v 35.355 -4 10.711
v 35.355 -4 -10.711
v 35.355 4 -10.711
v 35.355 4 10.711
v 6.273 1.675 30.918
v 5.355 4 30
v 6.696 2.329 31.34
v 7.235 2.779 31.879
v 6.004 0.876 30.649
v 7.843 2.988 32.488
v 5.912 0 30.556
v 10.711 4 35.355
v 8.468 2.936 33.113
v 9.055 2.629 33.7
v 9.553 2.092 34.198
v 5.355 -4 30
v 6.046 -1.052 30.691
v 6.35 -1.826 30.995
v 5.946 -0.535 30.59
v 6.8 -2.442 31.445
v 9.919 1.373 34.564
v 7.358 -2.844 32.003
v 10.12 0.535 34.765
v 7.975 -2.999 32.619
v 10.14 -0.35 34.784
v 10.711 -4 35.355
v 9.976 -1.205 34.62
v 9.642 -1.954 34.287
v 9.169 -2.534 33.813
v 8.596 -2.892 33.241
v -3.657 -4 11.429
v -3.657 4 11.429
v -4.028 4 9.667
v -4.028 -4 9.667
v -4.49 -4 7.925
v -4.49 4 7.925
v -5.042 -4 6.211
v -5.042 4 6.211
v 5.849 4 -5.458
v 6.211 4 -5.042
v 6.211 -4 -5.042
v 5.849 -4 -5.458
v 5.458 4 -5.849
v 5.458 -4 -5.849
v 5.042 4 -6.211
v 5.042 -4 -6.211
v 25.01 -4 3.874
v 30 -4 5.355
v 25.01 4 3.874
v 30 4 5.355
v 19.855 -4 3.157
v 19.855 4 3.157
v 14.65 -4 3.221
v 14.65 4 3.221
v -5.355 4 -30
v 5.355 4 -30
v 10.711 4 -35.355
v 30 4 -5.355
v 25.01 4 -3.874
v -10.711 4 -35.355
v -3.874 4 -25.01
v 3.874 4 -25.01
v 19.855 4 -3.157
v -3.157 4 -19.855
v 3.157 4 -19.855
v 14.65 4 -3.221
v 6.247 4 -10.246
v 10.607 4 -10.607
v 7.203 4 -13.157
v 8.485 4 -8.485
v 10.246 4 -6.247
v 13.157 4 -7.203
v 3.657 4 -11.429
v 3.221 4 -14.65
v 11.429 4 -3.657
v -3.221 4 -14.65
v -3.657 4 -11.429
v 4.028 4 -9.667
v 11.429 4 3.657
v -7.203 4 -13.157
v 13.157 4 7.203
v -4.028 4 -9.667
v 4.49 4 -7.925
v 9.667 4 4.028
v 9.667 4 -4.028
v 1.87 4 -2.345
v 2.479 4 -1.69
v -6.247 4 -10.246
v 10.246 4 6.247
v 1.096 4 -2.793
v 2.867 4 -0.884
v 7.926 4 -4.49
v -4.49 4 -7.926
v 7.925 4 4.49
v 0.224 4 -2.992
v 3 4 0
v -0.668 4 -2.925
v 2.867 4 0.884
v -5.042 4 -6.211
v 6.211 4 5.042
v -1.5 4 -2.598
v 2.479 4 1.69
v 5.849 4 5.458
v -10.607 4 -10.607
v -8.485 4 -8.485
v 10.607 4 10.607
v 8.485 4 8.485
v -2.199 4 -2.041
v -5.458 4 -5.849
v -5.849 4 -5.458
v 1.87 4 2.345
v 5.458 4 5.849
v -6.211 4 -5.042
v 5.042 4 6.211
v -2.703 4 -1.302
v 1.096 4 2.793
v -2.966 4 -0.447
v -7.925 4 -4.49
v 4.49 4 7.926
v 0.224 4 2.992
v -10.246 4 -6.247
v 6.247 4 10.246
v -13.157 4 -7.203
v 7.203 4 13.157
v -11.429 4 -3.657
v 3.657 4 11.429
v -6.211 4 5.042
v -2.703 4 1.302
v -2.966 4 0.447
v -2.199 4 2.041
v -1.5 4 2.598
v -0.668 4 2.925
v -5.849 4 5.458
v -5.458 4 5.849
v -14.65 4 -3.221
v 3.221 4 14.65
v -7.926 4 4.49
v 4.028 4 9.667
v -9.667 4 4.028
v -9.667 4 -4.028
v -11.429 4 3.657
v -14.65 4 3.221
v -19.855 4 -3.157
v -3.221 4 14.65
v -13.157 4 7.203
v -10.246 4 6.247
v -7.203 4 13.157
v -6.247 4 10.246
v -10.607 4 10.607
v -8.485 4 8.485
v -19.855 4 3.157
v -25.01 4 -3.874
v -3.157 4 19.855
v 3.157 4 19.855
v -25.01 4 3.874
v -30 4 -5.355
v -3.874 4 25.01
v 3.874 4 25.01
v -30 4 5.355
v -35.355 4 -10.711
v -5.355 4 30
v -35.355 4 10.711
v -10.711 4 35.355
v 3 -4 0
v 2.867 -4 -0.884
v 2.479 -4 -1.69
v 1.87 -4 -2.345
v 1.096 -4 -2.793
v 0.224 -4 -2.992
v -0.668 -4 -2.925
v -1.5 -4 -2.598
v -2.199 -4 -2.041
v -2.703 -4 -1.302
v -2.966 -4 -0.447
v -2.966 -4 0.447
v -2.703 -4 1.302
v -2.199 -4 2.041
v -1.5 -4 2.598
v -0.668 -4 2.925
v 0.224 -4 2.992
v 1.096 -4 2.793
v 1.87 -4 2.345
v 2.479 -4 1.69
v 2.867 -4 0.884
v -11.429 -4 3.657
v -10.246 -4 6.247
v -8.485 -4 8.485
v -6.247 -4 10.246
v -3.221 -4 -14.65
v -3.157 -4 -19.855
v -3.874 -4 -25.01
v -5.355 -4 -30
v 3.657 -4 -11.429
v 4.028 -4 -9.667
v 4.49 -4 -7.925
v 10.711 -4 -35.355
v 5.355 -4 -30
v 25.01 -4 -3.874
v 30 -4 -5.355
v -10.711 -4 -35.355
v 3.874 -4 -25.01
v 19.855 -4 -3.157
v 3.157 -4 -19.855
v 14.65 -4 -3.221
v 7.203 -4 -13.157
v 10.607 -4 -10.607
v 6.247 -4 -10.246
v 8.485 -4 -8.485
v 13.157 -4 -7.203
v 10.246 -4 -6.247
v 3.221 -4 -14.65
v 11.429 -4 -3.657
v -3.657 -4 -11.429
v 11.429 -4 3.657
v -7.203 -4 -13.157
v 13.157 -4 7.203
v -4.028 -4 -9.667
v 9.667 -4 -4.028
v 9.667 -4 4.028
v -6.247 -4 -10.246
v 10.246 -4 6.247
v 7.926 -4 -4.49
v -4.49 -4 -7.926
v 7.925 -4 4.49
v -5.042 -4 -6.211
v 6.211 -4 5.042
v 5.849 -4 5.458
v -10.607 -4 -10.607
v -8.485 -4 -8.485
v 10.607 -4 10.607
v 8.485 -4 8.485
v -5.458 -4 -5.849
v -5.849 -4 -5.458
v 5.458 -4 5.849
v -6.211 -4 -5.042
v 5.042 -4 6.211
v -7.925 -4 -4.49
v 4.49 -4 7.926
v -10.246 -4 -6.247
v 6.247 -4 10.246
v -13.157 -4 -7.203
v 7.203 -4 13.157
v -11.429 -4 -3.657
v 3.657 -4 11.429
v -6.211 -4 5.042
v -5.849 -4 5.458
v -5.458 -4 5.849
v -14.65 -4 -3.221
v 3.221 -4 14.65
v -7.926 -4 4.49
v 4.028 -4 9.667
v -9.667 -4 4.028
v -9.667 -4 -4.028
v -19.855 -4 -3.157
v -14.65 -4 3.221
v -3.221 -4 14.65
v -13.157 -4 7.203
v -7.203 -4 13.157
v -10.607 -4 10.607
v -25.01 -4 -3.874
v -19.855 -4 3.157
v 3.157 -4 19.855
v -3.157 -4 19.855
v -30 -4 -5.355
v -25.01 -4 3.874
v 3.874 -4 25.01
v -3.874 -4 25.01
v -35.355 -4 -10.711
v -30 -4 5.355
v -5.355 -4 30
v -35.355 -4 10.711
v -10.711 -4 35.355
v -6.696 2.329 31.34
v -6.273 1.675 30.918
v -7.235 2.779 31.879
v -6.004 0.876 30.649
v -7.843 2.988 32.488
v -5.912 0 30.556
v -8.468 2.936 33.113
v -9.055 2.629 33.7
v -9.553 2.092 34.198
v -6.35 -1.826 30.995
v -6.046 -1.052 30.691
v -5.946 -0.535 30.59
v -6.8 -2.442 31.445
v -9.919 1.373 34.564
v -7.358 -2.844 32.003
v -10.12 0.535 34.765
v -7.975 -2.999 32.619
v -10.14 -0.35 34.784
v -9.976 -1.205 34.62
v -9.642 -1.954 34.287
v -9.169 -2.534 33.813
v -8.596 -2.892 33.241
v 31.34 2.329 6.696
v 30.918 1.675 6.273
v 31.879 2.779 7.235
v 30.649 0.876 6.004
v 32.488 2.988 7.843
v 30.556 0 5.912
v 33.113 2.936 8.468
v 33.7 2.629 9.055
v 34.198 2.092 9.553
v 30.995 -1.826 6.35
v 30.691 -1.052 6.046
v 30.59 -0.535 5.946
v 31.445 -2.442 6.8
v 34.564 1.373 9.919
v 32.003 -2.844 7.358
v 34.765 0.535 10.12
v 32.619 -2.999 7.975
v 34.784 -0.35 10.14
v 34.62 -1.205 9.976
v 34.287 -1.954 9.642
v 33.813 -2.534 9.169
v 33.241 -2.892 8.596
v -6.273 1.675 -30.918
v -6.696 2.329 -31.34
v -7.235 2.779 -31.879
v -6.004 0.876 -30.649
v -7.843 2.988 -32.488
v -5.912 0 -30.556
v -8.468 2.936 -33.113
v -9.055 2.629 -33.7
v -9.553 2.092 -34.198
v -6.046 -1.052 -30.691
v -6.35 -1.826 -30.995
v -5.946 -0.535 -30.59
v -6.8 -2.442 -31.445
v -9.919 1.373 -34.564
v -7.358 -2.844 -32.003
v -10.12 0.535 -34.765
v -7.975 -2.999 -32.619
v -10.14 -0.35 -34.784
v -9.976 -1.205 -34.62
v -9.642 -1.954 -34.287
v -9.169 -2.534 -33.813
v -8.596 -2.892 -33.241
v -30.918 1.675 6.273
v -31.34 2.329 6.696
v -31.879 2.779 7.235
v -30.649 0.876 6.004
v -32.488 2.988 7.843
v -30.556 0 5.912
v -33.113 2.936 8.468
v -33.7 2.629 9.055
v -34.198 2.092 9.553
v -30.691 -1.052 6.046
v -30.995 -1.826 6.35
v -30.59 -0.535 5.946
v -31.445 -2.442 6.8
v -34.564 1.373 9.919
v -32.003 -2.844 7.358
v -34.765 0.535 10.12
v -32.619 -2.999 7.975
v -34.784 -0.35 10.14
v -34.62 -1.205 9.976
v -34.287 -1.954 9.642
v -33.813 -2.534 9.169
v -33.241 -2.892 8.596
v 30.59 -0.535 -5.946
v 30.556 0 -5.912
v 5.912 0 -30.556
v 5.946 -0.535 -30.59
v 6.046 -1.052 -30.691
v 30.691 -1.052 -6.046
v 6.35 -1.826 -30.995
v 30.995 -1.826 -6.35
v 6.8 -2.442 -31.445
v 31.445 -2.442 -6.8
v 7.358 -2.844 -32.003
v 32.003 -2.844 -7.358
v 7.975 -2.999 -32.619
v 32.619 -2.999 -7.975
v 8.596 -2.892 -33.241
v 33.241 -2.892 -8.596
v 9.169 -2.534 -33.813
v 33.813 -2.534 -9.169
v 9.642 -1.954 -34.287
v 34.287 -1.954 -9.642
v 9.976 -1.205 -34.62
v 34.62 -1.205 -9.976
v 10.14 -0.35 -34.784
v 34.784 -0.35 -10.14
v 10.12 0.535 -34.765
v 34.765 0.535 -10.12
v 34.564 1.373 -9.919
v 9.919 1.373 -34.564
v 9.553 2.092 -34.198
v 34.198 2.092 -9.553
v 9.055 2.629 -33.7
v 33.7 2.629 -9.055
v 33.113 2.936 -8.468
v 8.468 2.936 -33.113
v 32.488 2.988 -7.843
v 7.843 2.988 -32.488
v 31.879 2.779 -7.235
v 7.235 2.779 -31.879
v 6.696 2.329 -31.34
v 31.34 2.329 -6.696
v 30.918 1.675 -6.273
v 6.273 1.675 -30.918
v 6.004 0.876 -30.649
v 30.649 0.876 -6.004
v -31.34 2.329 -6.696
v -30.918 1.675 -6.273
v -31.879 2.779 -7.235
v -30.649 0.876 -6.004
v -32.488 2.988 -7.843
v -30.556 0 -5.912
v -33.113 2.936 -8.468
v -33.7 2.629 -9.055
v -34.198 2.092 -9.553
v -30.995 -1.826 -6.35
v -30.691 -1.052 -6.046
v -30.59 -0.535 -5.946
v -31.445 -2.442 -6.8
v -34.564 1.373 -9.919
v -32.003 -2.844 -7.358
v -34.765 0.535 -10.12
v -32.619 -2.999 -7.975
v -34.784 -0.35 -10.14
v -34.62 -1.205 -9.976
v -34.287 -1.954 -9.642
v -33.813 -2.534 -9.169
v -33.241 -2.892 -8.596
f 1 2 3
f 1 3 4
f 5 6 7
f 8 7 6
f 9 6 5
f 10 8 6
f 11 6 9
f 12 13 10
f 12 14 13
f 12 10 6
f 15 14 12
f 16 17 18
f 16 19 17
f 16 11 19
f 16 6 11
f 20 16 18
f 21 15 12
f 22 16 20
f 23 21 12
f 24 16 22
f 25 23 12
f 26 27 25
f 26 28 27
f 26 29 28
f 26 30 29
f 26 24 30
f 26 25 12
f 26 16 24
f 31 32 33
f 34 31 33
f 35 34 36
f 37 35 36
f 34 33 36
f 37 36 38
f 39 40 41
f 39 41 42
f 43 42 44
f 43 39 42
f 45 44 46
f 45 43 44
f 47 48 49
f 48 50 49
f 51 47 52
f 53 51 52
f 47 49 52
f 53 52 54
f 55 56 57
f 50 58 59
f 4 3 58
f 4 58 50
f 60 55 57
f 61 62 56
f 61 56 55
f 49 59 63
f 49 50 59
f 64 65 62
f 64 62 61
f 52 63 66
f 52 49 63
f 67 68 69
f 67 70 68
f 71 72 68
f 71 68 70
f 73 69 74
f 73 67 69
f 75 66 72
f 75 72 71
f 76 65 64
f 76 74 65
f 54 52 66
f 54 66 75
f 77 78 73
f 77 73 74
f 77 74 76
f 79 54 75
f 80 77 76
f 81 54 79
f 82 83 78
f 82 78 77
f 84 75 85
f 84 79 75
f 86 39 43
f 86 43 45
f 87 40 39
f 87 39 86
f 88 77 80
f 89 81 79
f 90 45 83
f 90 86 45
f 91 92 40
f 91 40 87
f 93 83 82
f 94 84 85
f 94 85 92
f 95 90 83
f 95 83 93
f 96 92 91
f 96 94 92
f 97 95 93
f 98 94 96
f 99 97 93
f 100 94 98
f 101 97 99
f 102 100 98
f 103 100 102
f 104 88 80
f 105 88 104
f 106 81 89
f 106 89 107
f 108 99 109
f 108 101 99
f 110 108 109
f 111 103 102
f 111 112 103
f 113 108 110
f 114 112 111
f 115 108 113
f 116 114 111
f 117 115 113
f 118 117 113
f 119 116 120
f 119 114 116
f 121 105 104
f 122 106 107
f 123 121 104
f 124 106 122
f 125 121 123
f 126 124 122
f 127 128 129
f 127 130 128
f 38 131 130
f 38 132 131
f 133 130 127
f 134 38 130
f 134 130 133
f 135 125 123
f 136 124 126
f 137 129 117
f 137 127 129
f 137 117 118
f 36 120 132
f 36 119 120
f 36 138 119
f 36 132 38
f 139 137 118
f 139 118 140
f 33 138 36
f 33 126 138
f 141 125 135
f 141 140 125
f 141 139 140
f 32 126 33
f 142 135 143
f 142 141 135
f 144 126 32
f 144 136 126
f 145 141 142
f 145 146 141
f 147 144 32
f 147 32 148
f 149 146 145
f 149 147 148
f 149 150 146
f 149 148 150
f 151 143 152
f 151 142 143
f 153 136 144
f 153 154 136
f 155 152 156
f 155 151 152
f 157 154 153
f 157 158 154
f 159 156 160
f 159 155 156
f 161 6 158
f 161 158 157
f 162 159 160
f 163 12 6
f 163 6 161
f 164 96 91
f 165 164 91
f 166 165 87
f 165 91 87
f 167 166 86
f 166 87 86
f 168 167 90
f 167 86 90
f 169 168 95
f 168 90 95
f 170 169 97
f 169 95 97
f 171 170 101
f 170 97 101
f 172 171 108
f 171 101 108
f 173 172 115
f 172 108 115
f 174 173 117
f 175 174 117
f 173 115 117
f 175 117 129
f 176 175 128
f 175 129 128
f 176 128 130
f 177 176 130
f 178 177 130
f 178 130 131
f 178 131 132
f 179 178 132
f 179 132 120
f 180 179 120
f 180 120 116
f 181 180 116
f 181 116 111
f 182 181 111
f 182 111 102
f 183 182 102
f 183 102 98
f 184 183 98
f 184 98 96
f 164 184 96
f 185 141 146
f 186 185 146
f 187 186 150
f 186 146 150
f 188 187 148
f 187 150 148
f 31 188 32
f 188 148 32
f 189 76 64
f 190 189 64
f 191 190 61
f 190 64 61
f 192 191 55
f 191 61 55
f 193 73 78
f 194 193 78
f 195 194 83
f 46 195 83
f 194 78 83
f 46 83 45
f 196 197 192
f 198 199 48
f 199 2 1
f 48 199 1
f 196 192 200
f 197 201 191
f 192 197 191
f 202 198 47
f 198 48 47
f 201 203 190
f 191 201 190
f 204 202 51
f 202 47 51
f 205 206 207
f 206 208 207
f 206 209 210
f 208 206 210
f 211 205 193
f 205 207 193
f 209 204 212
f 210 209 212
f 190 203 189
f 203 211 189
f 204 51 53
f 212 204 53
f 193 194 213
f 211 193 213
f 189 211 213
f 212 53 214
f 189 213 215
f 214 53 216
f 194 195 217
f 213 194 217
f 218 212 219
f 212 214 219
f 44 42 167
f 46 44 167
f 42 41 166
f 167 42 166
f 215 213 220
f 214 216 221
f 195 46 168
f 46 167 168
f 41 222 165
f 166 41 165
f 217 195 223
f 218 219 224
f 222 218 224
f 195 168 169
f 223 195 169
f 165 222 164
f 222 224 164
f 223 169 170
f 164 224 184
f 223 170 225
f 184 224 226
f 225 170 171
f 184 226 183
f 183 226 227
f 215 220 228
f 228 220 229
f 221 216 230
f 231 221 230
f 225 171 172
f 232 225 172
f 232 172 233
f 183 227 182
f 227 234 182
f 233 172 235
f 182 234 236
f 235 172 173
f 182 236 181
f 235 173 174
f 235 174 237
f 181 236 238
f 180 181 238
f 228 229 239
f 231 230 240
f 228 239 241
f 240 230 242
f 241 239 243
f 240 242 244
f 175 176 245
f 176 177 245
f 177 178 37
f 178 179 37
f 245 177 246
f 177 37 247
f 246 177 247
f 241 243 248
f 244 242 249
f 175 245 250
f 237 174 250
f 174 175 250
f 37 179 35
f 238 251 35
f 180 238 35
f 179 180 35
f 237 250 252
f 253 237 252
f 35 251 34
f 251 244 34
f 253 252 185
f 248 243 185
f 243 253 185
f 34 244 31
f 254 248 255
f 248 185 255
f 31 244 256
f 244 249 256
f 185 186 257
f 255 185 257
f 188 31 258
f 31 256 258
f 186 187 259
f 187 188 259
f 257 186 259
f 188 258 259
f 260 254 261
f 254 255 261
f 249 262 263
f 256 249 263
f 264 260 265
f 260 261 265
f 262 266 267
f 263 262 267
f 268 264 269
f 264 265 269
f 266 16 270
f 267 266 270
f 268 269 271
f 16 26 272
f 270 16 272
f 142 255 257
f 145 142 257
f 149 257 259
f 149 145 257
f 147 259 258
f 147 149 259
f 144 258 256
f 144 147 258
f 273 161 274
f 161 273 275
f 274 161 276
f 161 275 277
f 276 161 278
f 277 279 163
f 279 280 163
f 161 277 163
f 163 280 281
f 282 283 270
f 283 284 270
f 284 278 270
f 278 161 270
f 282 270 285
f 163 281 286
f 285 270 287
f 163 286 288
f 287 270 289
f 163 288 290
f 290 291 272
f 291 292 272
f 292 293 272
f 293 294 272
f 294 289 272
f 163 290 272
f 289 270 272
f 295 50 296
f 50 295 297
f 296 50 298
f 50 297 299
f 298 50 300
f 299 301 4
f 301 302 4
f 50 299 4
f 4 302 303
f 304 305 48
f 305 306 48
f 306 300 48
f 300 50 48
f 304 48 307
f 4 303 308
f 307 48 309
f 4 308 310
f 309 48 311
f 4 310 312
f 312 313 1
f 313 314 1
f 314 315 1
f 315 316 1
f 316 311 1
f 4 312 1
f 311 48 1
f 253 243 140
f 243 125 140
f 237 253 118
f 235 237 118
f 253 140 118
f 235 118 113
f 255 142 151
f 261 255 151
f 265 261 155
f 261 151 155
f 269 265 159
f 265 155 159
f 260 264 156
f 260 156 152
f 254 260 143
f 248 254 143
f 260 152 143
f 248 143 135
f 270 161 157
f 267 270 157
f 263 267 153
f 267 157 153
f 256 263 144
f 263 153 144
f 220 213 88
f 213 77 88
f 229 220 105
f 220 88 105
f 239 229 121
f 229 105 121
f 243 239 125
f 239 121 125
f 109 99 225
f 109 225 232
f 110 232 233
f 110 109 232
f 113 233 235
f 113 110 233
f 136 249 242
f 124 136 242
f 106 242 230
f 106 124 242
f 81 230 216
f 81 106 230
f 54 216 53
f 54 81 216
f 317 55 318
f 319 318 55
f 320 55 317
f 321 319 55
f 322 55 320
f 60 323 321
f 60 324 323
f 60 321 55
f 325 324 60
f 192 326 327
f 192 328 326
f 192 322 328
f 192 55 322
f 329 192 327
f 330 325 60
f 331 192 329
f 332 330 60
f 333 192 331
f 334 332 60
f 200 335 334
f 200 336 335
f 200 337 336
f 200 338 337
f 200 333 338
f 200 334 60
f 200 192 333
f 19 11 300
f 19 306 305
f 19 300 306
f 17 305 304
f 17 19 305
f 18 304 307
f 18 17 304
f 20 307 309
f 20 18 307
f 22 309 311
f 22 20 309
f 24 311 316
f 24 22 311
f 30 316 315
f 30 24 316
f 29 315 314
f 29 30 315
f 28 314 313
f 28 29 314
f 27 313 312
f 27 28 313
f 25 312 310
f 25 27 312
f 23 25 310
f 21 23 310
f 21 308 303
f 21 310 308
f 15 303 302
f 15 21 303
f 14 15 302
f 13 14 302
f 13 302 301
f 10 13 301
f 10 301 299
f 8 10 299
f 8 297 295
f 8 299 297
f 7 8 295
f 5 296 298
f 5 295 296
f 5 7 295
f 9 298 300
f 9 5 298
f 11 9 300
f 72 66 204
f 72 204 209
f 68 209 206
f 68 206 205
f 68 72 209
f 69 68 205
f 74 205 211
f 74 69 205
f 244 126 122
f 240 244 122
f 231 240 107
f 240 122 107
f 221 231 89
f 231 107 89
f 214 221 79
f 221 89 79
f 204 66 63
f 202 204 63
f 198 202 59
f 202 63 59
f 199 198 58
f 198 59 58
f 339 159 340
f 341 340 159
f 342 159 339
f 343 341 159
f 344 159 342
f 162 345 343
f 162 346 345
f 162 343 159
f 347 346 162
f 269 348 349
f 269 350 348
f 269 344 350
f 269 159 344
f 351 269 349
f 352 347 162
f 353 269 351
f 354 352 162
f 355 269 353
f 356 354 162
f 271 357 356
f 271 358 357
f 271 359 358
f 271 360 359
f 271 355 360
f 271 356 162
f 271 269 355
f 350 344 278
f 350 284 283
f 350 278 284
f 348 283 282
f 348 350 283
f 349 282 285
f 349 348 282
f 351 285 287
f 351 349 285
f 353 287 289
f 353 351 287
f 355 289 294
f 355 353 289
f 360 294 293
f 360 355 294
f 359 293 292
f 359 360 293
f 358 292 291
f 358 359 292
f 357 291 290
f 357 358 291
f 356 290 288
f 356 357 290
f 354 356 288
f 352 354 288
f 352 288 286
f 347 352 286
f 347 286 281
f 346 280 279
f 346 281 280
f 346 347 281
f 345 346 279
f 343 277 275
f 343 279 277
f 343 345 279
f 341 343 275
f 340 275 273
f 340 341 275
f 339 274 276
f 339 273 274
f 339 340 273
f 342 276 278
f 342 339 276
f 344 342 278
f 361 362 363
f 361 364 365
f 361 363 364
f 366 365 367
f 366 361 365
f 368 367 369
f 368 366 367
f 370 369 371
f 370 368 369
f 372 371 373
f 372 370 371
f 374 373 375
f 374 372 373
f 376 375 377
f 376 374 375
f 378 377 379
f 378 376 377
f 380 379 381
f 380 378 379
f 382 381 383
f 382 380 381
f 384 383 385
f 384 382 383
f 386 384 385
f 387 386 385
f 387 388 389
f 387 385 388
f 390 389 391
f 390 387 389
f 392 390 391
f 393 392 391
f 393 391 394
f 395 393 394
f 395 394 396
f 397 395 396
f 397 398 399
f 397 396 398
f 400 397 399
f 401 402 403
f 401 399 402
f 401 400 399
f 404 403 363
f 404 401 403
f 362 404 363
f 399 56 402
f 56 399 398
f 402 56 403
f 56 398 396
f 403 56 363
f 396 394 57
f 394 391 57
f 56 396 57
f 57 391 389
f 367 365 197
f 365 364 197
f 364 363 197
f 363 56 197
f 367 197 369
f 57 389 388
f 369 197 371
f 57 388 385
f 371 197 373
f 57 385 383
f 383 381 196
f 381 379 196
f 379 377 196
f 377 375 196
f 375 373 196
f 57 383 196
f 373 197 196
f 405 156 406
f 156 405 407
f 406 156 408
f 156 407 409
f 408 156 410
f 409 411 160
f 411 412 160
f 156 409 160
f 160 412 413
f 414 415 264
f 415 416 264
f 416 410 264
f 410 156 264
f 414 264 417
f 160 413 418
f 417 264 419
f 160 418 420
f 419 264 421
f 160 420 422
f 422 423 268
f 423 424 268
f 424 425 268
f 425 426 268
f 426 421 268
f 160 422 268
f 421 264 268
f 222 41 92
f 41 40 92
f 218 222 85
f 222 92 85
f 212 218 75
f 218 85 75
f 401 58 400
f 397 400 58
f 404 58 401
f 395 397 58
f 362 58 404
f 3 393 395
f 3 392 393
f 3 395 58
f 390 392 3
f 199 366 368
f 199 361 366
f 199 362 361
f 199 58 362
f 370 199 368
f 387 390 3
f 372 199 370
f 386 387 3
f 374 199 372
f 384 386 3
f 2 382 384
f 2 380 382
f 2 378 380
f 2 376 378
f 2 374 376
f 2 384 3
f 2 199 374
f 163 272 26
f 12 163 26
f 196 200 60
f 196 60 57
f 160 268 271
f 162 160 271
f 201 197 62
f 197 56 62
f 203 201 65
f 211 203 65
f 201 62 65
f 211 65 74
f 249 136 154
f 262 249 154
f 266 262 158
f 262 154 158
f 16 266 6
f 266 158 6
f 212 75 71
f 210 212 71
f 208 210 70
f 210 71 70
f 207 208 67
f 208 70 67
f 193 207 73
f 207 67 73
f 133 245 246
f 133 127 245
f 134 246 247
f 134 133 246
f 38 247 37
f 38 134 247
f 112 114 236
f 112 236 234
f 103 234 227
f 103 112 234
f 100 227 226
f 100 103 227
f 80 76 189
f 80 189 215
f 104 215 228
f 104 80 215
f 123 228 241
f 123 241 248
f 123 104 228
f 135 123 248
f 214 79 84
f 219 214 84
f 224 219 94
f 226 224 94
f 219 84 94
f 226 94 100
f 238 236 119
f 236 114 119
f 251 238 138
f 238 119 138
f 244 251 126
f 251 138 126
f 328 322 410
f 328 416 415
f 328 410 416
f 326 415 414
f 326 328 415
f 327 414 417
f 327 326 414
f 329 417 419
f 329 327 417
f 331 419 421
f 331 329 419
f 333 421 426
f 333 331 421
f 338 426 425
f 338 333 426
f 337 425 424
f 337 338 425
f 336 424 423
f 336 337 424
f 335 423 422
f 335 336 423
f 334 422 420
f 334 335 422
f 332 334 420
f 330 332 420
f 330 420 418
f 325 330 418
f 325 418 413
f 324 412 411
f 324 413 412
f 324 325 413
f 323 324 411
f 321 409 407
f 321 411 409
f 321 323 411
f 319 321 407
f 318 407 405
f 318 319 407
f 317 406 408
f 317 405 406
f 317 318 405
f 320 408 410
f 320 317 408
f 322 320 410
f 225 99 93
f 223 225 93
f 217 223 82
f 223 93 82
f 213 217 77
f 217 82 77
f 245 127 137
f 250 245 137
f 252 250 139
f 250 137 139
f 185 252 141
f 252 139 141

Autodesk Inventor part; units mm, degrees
ref_plane "YZ Plane" through (0, 0, 0) normal (1, 0, 0) x (0, 1, 0)
ref_plane "XZ Plane" through (0, 0, 0) normal (0, 1, 0) x (-1, 0, 0)
ref_plane "XY Plane" through (0, 0, 0) normal (0, 0, 1) x (1, 0, 0)
sketch "スケッチ1" plane through (0, 0, 0) normal (0, 1, 0) x (-1, 0, 0)
  line L0 (-35.3553, 0) -> (0, 35.3553)
  line L1 (0, 35.3553) -> (35.3553, 0)
  line L2 (35.3553, 0) -> (0, -35.3553)
  line L3 (0, -35.3553) -> (-35.3553, 0)
  line L4 (-25, 25) -> (25, -25) construction
  line L5 (25, 25) -> (-25, -25) construction
  line L6 (0, 0) -> (0, -30)
  line L7 (0, -30) -> (5.3553, -30)
  line L8 (5.3553, -30) -> (10.7107, -35.3553)
  line L9 (5.3553, -30) -> (5.3553, 0)
  line L10 (0, 0) -> (30, 0)
  line L11 (30, 0) -> (30, -5.3553)
  line L12 (30, -5.3553) -> (0, -5.3553)
  line L13 (35.3553, 0) -> (47.1243, -11.769)
  line L14 (35.3553, 0) -> (35.3553, -35.3553)
  line L15 (0, -35.3553) -> (35.3553, -35.3553)
  line L16 (30, -5.3553) -> (35.3553, -10.7107)
  line L17 (5.3553, 30) -> (5.3553, 0)
  line L18 (30, 5.3553) -> (0, 5.3553)
  line L19 (0, 35.3553) -> (35.3553, 0)
  line L20 (30, 5.3553) -> (35.3553, 10.7107)
  line L21 (30, 0) -> (30, 5.3553)
  line L22 (0, 30) -> (5.3553, 30)
  line L23 (5.3553, 30) -> (10.7107, 35.3553)
  line L24 (0, 35.3553) -> (35.3553, 35.3553)
  line L25 (35.3553, 0) -> (35.3553, 35.3553)
  line L26 (0, 0) -> (0, 30)
  line L27 (0, 0) -> (30, 0)
  line L28 (-30, 5.3553) -> (0, 5.3553)
  line L29 (-5.3553, 30) -> (-5.3553, 0)
  line L30 (-35.3553, 0) -> (0, 35.3553)
  line L31 (-5.3553, 30) -> (-10.7107, 35.3553)
  line L32 (0, 30) -> (-5.3553, 30)
  line L33 (-30, 0) -> (-30, 5.3553)
  line L34 (-30, 5.3553) -> (-35.3553, 10.7107)
  line L35 (-35.3553, 0) -> (-35.3553, 35.3553)
  line L36 (0, 35.3553) -> (-35.3553, 35.3553)
  line L37 (0, 0) -> (-30, 0)
  line L38 (0, 0) -> (0, 30)
  line L39 (-5.3553, -30) -> (-5.3553, 0)
  line L40 (-30, -5.3553) -> (0, -5.3553)
  line L41 (0, -35.3553) -> (-35.3553, 0)
  line L42 (-30, -5.3553) -> (-35.3553, -10.7107)
  line L43 (-30, 0) -> (-30, -5.3553)
  line L44 (0, -30) -> (-5.3553, -30)
  line L45 (-5.3553, -30) -> (-10.7107, -35.3553)
  line L46 (0, -35.3553) -> (-35.3553, -35.3553)
  line L47 (-35.3553, 0) -> (-35.3553, -35.3553)
  line L48 (0, 0) -> (0, -30)
  line L49 (0, 0) -> (-30, 0)
  point P0 (35.3553, 0)
  point P1 (5.3553, 5.3553)
  point P2 (-5.3553, 5.3553)
  point P3 (-5.3553, -5.3553)
  point P4 (0, -35.3553)
  point P5 (5.3553, -5.3553)
  dimension "d0" = 50
  dimension "d1" = 50
  dimension "d3" = 30
  dimension "d4" = 30
  dimension "d7" = 360
extrude "押し出し1" add sketch "スケッチ1" along normal mid plane 8 contours L35 L34 L0 | L0 L33 L43 L3 | L3 L42 L47 | L28 L29 L37 L33 | L43 L37 L39 L40 | L31 L36 L0 | L32 L26 L28 L29 | L0 L1 L22 L32 | L28 L26 L37 L29 | L44 L7 L2 L3 | L39 L40 L6 L44 | L3 L46 L45 | L39 L37 L6 L40 | L24 L23 L1 | L22 L17 L18 L26 | L18 L17 L10 L26 | L2 L8 L15 | L6 L12 L9 L7 | L6 L10 L9 L12 | L18 L21 L10 L17 | L9 L10 L11 L12 | L20 L25 L1 | L1 L2 L11 L21 | L2 L14 L16
sketch "スケッチ3" plane through (5.3553, -4, 30) normal (0.7071, 0, -0.7071) x (-0.7071, 0, -0.7071)
  line L0 (-7.5736, 8) -> (7.5736, 8) projected
  line L1 (17.4264, 0) -> (0, 0) projected
  line L2 (-7.5736, 8) -> (0, 0)
  line L3 (-7.5736, 0) -> (7.5736, 0) projected
  line L4 (0, 8) -> (-7.5736, 0)
  circle A0 centre (-3.7868, 4) radius 3
  point P0 (25, 4)
  dimension "d12" = 6
extrude "押し出し2" add sketch "スケッチ3" along normal blind 35 contours A0 L4 L2 | L2 L4 A0 | A0 L2 L4 | L2 A0 L4
pattern_circular "円形状パターン1" count 4 over 360 about axis through (0, -10, 0) along (0, 1, 0) of "押し出し2"
sketch "スケッチ4" plane through (0, 4, 0) normal (0, 1, 0) x (1, 0, 0)
  line L0 (-30, -5.3553) -> (-5.3553, -5.3553)
  line L1 (-35.3553, -10.7107) -> (-30, -5.3553)
  arc A0 (-5.3553, -5.3553) -> (-30, -5.3553) centre (-17.6777, -37.7141) ccw
  line L2 (-30, -5.3553) -> (-5.3553, -5.3553)
  line L3 (-35.3553, 0) -> (35.3553, 0)
  line L4 (35.3553, -10.7107) -> (35.3553, 10.7107)
  line L5 (10.7107, 35.3553) -> (-10.7107, 35.3553)
  line L6 (0, 35.3553) -> (0, -35.3553)
  arc A1 (-30, 5.3553) -> (-5.3553, 5.3553) centre (-17.6777, 37.7141) ccw
  arc A2 (5.3553, -5.3553) -> (5.3553, -30) centre (37.7141, -17.6777) ccw
  line L7 (5.3553, -30) -> (5.3553, -5.3553)
  arc A3 (-5.3553, -30) -> (-5.3553, -5.3553) centre (-37.7141, -17.6777) ccw
  arc A4 (5.3553, 5.3553) -> (30, 5.3553) centre (17.6777, 37.7141) ccw
  line L8 (30, 5.3553) -> (5.3553, 5.3553)
  arc A5 (30, -5.3553) -> (5.3553, -5.3553) centre (17.6777, -37.7141) ccw
  arc A6 (-5.3553, 5.3553) -> (-5.3553, 30) centre (-37.7141, 17.6777) ccw
  line L9 (-5.3553, 30) -> (-5.3553, 5.3553)
  arc A7 (5.3553, 30) -> (5.3553, 5.3553) centre (37.7141, 17.6777) ccw
  line L10 (-30, 5.3553) -> (-35.3553, 10.7107)
  line L11 (-30, 5.3553) -> (-5.3553, 5.3553)
  line L12 (-30, 5.3553) -> (-5.3553, 5.3553)
  line L13 (-5.3553, 30) -> (-5.3553, 5.3553)
  line L14 (5.3553, 30) -> (5.3553, 5.3553)
  line L15 (5.3553, -5.3553) -> (30, -5.3553)
  line L16 (10.7107, -35.3553) -> (5.3553, -30)
  line L17 (5.3553, -5.3553) -> (5.3553, -30)
  line L18 (-5.3553, -5.3553) -> (-5.3553, -30)
  point P0 (0, 0)
  point P1 (-5.3553, 5.3553)
  point P2 (-5.3553, 5.3553)
  point P3 (5.3553, 5.3553)
  point P4 (5.3553, 5.3553)
  point P5 (5.3553, 5.3553)
  point P6 (5.3553, 5.3553)
  dimension "d20" = 360
extrude "押し出し3" cut sketch "スケッチ4" against normal blind 8
sketch "スケッチ5" plane through (0, 4, 0) normal (0, 1, 0) x (1, 0, 0)
  circle A0 centre (0, 0) radius 15
  circle A1 centre (0, 0) radius 12
  circle A2 centre (0, 0) radius 8
  circle A3 centre (0, 0) radius 3
  dimension "d24" = 30
  dimension "d25" = 6
  dimension "d26" = 24
  dimension "d27" = 16
extrude "押し出し4" add sketch "スケッチ5" against normal blind 8 contours A0 | A2 | A3
sketch "スケッチ6" plane through (0, 4, 0) normal (0, 1, 0) x (1, 0, 0)
  circle A0 centre (0, 0) radius 3
  dimension "d30" = 6
extrude "押し出し5" cut sketch "スケッチ6" against normal blind 8
